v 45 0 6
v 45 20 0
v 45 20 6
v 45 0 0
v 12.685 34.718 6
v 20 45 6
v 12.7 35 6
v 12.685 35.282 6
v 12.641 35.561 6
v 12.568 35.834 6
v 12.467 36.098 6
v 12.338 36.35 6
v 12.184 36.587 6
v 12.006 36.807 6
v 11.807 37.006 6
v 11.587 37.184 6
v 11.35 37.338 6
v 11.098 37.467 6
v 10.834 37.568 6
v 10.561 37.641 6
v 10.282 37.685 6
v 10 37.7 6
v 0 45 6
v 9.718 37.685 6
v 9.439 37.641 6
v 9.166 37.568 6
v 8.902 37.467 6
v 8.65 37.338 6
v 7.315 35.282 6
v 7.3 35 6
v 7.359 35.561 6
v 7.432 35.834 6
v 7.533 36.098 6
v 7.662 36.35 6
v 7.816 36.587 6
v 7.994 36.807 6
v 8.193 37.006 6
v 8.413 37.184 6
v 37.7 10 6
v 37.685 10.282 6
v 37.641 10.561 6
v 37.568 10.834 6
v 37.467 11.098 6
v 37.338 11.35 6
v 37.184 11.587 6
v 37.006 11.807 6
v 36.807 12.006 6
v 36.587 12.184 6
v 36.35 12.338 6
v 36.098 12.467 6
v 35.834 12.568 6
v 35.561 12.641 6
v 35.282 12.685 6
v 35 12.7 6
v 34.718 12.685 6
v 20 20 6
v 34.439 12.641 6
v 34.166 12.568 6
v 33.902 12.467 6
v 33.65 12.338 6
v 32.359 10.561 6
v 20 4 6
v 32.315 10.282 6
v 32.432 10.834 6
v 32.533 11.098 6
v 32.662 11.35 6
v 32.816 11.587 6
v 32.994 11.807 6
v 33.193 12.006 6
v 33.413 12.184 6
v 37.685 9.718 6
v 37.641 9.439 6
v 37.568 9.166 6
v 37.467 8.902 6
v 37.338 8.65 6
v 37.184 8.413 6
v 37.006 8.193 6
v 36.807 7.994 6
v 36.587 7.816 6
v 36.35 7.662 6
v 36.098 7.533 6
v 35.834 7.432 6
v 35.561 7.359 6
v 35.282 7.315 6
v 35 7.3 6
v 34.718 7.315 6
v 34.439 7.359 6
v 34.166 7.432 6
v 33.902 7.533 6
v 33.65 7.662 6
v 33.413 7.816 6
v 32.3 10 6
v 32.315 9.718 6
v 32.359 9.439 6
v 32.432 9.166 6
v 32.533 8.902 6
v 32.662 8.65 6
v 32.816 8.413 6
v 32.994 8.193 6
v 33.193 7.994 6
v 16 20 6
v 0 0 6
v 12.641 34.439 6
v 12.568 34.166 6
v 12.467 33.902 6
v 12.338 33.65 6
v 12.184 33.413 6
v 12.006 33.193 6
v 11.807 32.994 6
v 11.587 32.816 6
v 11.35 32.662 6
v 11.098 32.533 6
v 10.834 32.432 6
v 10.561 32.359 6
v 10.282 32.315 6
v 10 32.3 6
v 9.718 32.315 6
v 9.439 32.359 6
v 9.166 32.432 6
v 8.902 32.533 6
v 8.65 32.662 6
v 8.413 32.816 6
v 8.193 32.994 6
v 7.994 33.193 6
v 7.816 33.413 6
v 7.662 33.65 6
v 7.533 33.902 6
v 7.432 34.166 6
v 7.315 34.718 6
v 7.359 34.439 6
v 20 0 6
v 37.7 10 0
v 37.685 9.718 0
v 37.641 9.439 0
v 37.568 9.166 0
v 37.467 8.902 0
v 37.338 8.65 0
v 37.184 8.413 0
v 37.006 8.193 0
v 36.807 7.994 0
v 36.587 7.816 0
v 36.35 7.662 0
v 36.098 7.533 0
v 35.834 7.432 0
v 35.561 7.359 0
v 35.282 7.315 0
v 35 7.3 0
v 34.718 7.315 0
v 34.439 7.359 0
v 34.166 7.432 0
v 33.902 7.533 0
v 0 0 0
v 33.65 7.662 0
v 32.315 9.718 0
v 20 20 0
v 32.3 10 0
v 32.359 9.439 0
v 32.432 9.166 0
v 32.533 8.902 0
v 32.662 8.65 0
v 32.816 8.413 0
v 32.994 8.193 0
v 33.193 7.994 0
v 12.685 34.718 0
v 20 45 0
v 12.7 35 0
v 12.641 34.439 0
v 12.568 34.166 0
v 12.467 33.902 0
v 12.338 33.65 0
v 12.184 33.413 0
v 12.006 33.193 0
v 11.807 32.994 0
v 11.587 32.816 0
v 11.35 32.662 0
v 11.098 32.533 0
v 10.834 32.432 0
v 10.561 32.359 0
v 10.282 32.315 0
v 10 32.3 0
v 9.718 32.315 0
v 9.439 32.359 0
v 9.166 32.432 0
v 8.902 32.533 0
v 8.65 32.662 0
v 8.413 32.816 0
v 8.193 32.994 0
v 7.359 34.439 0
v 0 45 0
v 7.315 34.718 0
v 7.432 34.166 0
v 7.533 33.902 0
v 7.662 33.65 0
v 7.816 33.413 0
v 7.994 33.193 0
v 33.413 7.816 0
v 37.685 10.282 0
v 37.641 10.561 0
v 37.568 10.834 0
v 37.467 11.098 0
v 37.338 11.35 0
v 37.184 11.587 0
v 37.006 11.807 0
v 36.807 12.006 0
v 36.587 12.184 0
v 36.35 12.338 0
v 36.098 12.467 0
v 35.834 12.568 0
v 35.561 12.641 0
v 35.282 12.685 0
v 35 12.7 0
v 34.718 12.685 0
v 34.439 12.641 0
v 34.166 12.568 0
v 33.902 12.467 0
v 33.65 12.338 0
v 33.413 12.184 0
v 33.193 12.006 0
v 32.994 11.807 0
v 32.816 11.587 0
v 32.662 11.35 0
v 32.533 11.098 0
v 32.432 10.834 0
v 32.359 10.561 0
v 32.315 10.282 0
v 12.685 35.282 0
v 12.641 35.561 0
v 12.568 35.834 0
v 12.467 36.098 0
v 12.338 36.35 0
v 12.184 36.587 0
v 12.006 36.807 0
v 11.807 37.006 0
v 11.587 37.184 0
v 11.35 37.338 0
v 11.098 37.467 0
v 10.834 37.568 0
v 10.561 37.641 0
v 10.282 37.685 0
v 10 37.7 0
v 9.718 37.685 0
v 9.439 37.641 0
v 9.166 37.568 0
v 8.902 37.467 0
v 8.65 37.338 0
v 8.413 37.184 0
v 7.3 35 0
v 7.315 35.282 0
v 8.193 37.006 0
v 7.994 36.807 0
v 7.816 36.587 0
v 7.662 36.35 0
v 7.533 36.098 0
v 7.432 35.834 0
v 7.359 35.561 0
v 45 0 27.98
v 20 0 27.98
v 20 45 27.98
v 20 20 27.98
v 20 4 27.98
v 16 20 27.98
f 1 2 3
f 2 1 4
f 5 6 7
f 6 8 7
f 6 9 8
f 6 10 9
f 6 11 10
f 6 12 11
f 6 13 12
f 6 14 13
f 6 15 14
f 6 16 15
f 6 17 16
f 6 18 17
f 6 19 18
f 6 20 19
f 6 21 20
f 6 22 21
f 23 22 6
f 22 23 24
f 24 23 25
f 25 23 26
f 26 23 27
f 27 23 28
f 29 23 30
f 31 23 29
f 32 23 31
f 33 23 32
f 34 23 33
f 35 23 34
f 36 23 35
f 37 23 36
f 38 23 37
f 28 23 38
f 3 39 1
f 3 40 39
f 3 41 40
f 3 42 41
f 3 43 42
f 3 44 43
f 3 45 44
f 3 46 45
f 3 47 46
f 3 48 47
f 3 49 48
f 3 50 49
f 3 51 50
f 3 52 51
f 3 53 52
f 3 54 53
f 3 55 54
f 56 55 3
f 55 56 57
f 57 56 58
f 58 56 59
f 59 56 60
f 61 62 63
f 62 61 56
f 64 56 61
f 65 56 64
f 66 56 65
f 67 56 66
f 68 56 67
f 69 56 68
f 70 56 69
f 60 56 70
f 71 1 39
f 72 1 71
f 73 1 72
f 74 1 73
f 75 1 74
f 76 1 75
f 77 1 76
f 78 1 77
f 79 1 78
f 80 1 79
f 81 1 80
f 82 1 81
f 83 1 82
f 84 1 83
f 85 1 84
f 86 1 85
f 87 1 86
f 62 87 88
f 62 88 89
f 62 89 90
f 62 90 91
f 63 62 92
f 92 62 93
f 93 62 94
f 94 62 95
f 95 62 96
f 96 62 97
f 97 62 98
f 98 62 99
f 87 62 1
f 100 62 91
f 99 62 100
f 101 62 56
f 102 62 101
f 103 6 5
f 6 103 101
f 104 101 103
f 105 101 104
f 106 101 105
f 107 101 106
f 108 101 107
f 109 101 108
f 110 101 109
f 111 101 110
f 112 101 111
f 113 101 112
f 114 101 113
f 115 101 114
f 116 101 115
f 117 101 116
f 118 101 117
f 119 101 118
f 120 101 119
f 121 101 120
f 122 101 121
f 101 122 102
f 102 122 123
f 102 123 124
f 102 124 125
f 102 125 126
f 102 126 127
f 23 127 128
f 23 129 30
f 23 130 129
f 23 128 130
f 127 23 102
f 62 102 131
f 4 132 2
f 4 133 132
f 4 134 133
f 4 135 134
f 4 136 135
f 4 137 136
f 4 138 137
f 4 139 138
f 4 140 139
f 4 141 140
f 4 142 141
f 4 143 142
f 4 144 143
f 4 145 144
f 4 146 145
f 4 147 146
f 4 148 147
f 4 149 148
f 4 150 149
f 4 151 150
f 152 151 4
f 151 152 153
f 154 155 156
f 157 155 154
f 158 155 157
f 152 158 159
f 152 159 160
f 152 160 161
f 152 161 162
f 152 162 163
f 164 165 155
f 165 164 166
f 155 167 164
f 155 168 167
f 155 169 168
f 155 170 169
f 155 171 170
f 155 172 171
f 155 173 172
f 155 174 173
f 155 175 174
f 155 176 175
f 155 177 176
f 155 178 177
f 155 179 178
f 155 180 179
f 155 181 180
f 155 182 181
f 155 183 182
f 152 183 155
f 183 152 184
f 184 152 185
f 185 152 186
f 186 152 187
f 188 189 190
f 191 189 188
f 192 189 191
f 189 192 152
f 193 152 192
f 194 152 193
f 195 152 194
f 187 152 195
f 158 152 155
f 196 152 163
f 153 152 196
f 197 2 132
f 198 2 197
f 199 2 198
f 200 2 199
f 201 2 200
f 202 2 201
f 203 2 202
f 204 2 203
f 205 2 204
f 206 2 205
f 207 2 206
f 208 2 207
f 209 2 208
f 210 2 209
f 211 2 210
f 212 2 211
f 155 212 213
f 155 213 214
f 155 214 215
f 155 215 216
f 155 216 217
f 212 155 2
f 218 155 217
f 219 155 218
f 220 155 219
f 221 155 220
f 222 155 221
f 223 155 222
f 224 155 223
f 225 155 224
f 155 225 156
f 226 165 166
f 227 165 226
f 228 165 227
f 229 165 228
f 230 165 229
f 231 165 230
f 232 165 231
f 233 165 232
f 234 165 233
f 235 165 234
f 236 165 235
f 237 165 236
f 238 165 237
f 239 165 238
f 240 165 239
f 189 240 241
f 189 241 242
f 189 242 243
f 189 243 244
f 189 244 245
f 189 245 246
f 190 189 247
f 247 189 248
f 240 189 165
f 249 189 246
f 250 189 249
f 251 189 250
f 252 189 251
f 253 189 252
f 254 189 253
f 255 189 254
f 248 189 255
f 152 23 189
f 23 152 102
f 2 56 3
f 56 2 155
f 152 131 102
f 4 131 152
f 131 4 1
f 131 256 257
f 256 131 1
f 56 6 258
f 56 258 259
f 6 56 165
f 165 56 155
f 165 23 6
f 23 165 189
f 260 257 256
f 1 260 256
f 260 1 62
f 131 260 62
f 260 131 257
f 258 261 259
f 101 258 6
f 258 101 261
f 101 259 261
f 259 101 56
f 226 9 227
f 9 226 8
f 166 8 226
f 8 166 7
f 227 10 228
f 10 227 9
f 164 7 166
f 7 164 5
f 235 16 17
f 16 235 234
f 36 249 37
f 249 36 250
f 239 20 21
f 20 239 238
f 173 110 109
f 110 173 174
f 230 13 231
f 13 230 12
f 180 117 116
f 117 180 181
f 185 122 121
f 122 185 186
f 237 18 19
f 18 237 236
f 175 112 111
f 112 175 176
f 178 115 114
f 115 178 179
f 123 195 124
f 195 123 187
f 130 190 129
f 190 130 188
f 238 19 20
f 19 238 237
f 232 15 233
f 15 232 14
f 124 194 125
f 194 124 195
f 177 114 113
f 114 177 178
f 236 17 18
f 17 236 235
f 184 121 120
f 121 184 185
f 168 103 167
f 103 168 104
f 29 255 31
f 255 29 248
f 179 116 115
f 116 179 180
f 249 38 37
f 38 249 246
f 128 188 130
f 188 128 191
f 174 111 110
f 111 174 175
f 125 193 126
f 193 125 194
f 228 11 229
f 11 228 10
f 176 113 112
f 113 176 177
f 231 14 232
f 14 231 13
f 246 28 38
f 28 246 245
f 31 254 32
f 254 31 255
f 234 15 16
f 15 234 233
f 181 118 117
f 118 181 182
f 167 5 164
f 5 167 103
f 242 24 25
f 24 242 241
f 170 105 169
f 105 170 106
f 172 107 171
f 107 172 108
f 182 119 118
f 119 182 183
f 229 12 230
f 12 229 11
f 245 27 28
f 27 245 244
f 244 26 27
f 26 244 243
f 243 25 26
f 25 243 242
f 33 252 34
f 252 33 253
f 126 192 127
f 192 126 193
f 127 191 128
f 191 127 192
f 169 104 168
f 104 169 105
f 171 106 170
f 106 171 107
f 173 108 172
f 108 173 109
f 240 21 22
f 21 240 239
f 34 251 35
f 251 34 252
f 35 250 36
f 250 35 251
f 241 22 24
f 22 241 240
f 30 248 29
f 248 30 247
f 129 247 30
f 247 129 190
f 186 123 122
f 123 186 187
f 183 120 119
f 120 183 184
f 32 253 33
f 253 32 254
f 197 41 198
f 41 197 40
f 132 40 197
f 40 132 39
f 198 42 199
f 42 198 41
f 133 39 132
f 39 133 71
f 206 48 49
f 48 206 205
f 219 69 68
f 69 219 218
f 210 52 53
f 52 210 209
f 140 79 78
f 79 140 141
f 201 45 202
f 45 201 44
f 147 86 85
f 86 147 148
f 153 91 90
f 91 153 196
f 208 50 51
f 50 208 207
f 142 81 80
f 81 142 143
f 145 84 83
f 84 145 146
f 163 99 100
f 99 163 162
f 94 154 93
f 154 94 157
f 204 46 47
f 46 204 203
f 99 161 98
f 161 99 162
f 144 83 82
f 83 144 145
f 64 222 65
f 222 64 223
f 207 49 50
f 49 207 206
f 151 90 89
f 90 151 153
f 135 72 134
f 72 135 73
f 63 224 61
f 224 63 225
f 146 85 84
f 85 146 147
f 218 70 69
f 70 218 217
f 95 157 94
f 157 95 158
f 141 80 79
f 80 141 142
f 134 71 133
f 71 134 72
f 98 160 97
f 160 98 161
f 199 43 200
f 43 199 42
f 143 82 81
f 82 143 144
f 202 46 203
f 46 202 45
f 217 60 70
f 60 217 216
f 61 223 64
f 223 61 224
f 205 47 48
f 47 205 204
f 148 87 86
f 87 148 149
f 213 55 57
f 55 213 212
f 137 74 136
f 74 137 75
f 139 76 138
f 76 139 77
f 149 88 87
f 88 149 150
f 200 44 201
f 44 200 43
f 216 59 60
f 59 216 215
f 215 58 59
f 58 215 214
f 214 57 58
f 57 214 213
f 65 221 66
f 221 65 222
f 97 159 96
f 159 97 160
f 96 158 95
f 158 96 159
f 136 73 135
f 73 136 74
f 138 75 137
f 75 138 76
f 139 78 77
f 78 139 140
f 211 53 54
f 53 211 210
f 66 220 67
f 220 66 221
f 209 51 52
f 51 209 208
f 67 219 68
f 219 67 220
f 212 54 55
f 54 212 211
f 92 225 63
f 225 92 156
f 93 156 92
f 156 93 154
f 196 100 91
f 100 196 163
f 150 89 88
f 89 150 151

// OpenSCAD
// Reinforced right-angle gusset for 20 mm profile.
$fn = 60;
eps = 0.02;
profile = 20;
arm = 45;
plate_t = 6;
rib_t = 4;
rib_h = 22;
module rib_x() {
    translate([profile, 0, plate_t - eps]) linear_extrude(height = rib_h)
        polygon(points = [[0, 0], [arm - profile, 0], [0, rib_t]]);
}
module rib_y() {
    translate([profile, profile, plate_t - eps]) rotate([0, 0, 90]) linear_extrude(height = rib_h)
        polygon(points = [[0, 0], [arm - profile, 0], [0, rib_t]]);
}
difference() {
    union() { cube([arm, profile, plate_t]); cube([profile, arm, plate_t]); rib_x(); rib_y(); }
    for (p = [[profile / 2, arm - profile / 2], [arm - profile / 2, profile / 2]])
        translate([p[0], p[1], -eps]) cylinder(d = 5.4, h = plate_t + 2 * eps);
}
